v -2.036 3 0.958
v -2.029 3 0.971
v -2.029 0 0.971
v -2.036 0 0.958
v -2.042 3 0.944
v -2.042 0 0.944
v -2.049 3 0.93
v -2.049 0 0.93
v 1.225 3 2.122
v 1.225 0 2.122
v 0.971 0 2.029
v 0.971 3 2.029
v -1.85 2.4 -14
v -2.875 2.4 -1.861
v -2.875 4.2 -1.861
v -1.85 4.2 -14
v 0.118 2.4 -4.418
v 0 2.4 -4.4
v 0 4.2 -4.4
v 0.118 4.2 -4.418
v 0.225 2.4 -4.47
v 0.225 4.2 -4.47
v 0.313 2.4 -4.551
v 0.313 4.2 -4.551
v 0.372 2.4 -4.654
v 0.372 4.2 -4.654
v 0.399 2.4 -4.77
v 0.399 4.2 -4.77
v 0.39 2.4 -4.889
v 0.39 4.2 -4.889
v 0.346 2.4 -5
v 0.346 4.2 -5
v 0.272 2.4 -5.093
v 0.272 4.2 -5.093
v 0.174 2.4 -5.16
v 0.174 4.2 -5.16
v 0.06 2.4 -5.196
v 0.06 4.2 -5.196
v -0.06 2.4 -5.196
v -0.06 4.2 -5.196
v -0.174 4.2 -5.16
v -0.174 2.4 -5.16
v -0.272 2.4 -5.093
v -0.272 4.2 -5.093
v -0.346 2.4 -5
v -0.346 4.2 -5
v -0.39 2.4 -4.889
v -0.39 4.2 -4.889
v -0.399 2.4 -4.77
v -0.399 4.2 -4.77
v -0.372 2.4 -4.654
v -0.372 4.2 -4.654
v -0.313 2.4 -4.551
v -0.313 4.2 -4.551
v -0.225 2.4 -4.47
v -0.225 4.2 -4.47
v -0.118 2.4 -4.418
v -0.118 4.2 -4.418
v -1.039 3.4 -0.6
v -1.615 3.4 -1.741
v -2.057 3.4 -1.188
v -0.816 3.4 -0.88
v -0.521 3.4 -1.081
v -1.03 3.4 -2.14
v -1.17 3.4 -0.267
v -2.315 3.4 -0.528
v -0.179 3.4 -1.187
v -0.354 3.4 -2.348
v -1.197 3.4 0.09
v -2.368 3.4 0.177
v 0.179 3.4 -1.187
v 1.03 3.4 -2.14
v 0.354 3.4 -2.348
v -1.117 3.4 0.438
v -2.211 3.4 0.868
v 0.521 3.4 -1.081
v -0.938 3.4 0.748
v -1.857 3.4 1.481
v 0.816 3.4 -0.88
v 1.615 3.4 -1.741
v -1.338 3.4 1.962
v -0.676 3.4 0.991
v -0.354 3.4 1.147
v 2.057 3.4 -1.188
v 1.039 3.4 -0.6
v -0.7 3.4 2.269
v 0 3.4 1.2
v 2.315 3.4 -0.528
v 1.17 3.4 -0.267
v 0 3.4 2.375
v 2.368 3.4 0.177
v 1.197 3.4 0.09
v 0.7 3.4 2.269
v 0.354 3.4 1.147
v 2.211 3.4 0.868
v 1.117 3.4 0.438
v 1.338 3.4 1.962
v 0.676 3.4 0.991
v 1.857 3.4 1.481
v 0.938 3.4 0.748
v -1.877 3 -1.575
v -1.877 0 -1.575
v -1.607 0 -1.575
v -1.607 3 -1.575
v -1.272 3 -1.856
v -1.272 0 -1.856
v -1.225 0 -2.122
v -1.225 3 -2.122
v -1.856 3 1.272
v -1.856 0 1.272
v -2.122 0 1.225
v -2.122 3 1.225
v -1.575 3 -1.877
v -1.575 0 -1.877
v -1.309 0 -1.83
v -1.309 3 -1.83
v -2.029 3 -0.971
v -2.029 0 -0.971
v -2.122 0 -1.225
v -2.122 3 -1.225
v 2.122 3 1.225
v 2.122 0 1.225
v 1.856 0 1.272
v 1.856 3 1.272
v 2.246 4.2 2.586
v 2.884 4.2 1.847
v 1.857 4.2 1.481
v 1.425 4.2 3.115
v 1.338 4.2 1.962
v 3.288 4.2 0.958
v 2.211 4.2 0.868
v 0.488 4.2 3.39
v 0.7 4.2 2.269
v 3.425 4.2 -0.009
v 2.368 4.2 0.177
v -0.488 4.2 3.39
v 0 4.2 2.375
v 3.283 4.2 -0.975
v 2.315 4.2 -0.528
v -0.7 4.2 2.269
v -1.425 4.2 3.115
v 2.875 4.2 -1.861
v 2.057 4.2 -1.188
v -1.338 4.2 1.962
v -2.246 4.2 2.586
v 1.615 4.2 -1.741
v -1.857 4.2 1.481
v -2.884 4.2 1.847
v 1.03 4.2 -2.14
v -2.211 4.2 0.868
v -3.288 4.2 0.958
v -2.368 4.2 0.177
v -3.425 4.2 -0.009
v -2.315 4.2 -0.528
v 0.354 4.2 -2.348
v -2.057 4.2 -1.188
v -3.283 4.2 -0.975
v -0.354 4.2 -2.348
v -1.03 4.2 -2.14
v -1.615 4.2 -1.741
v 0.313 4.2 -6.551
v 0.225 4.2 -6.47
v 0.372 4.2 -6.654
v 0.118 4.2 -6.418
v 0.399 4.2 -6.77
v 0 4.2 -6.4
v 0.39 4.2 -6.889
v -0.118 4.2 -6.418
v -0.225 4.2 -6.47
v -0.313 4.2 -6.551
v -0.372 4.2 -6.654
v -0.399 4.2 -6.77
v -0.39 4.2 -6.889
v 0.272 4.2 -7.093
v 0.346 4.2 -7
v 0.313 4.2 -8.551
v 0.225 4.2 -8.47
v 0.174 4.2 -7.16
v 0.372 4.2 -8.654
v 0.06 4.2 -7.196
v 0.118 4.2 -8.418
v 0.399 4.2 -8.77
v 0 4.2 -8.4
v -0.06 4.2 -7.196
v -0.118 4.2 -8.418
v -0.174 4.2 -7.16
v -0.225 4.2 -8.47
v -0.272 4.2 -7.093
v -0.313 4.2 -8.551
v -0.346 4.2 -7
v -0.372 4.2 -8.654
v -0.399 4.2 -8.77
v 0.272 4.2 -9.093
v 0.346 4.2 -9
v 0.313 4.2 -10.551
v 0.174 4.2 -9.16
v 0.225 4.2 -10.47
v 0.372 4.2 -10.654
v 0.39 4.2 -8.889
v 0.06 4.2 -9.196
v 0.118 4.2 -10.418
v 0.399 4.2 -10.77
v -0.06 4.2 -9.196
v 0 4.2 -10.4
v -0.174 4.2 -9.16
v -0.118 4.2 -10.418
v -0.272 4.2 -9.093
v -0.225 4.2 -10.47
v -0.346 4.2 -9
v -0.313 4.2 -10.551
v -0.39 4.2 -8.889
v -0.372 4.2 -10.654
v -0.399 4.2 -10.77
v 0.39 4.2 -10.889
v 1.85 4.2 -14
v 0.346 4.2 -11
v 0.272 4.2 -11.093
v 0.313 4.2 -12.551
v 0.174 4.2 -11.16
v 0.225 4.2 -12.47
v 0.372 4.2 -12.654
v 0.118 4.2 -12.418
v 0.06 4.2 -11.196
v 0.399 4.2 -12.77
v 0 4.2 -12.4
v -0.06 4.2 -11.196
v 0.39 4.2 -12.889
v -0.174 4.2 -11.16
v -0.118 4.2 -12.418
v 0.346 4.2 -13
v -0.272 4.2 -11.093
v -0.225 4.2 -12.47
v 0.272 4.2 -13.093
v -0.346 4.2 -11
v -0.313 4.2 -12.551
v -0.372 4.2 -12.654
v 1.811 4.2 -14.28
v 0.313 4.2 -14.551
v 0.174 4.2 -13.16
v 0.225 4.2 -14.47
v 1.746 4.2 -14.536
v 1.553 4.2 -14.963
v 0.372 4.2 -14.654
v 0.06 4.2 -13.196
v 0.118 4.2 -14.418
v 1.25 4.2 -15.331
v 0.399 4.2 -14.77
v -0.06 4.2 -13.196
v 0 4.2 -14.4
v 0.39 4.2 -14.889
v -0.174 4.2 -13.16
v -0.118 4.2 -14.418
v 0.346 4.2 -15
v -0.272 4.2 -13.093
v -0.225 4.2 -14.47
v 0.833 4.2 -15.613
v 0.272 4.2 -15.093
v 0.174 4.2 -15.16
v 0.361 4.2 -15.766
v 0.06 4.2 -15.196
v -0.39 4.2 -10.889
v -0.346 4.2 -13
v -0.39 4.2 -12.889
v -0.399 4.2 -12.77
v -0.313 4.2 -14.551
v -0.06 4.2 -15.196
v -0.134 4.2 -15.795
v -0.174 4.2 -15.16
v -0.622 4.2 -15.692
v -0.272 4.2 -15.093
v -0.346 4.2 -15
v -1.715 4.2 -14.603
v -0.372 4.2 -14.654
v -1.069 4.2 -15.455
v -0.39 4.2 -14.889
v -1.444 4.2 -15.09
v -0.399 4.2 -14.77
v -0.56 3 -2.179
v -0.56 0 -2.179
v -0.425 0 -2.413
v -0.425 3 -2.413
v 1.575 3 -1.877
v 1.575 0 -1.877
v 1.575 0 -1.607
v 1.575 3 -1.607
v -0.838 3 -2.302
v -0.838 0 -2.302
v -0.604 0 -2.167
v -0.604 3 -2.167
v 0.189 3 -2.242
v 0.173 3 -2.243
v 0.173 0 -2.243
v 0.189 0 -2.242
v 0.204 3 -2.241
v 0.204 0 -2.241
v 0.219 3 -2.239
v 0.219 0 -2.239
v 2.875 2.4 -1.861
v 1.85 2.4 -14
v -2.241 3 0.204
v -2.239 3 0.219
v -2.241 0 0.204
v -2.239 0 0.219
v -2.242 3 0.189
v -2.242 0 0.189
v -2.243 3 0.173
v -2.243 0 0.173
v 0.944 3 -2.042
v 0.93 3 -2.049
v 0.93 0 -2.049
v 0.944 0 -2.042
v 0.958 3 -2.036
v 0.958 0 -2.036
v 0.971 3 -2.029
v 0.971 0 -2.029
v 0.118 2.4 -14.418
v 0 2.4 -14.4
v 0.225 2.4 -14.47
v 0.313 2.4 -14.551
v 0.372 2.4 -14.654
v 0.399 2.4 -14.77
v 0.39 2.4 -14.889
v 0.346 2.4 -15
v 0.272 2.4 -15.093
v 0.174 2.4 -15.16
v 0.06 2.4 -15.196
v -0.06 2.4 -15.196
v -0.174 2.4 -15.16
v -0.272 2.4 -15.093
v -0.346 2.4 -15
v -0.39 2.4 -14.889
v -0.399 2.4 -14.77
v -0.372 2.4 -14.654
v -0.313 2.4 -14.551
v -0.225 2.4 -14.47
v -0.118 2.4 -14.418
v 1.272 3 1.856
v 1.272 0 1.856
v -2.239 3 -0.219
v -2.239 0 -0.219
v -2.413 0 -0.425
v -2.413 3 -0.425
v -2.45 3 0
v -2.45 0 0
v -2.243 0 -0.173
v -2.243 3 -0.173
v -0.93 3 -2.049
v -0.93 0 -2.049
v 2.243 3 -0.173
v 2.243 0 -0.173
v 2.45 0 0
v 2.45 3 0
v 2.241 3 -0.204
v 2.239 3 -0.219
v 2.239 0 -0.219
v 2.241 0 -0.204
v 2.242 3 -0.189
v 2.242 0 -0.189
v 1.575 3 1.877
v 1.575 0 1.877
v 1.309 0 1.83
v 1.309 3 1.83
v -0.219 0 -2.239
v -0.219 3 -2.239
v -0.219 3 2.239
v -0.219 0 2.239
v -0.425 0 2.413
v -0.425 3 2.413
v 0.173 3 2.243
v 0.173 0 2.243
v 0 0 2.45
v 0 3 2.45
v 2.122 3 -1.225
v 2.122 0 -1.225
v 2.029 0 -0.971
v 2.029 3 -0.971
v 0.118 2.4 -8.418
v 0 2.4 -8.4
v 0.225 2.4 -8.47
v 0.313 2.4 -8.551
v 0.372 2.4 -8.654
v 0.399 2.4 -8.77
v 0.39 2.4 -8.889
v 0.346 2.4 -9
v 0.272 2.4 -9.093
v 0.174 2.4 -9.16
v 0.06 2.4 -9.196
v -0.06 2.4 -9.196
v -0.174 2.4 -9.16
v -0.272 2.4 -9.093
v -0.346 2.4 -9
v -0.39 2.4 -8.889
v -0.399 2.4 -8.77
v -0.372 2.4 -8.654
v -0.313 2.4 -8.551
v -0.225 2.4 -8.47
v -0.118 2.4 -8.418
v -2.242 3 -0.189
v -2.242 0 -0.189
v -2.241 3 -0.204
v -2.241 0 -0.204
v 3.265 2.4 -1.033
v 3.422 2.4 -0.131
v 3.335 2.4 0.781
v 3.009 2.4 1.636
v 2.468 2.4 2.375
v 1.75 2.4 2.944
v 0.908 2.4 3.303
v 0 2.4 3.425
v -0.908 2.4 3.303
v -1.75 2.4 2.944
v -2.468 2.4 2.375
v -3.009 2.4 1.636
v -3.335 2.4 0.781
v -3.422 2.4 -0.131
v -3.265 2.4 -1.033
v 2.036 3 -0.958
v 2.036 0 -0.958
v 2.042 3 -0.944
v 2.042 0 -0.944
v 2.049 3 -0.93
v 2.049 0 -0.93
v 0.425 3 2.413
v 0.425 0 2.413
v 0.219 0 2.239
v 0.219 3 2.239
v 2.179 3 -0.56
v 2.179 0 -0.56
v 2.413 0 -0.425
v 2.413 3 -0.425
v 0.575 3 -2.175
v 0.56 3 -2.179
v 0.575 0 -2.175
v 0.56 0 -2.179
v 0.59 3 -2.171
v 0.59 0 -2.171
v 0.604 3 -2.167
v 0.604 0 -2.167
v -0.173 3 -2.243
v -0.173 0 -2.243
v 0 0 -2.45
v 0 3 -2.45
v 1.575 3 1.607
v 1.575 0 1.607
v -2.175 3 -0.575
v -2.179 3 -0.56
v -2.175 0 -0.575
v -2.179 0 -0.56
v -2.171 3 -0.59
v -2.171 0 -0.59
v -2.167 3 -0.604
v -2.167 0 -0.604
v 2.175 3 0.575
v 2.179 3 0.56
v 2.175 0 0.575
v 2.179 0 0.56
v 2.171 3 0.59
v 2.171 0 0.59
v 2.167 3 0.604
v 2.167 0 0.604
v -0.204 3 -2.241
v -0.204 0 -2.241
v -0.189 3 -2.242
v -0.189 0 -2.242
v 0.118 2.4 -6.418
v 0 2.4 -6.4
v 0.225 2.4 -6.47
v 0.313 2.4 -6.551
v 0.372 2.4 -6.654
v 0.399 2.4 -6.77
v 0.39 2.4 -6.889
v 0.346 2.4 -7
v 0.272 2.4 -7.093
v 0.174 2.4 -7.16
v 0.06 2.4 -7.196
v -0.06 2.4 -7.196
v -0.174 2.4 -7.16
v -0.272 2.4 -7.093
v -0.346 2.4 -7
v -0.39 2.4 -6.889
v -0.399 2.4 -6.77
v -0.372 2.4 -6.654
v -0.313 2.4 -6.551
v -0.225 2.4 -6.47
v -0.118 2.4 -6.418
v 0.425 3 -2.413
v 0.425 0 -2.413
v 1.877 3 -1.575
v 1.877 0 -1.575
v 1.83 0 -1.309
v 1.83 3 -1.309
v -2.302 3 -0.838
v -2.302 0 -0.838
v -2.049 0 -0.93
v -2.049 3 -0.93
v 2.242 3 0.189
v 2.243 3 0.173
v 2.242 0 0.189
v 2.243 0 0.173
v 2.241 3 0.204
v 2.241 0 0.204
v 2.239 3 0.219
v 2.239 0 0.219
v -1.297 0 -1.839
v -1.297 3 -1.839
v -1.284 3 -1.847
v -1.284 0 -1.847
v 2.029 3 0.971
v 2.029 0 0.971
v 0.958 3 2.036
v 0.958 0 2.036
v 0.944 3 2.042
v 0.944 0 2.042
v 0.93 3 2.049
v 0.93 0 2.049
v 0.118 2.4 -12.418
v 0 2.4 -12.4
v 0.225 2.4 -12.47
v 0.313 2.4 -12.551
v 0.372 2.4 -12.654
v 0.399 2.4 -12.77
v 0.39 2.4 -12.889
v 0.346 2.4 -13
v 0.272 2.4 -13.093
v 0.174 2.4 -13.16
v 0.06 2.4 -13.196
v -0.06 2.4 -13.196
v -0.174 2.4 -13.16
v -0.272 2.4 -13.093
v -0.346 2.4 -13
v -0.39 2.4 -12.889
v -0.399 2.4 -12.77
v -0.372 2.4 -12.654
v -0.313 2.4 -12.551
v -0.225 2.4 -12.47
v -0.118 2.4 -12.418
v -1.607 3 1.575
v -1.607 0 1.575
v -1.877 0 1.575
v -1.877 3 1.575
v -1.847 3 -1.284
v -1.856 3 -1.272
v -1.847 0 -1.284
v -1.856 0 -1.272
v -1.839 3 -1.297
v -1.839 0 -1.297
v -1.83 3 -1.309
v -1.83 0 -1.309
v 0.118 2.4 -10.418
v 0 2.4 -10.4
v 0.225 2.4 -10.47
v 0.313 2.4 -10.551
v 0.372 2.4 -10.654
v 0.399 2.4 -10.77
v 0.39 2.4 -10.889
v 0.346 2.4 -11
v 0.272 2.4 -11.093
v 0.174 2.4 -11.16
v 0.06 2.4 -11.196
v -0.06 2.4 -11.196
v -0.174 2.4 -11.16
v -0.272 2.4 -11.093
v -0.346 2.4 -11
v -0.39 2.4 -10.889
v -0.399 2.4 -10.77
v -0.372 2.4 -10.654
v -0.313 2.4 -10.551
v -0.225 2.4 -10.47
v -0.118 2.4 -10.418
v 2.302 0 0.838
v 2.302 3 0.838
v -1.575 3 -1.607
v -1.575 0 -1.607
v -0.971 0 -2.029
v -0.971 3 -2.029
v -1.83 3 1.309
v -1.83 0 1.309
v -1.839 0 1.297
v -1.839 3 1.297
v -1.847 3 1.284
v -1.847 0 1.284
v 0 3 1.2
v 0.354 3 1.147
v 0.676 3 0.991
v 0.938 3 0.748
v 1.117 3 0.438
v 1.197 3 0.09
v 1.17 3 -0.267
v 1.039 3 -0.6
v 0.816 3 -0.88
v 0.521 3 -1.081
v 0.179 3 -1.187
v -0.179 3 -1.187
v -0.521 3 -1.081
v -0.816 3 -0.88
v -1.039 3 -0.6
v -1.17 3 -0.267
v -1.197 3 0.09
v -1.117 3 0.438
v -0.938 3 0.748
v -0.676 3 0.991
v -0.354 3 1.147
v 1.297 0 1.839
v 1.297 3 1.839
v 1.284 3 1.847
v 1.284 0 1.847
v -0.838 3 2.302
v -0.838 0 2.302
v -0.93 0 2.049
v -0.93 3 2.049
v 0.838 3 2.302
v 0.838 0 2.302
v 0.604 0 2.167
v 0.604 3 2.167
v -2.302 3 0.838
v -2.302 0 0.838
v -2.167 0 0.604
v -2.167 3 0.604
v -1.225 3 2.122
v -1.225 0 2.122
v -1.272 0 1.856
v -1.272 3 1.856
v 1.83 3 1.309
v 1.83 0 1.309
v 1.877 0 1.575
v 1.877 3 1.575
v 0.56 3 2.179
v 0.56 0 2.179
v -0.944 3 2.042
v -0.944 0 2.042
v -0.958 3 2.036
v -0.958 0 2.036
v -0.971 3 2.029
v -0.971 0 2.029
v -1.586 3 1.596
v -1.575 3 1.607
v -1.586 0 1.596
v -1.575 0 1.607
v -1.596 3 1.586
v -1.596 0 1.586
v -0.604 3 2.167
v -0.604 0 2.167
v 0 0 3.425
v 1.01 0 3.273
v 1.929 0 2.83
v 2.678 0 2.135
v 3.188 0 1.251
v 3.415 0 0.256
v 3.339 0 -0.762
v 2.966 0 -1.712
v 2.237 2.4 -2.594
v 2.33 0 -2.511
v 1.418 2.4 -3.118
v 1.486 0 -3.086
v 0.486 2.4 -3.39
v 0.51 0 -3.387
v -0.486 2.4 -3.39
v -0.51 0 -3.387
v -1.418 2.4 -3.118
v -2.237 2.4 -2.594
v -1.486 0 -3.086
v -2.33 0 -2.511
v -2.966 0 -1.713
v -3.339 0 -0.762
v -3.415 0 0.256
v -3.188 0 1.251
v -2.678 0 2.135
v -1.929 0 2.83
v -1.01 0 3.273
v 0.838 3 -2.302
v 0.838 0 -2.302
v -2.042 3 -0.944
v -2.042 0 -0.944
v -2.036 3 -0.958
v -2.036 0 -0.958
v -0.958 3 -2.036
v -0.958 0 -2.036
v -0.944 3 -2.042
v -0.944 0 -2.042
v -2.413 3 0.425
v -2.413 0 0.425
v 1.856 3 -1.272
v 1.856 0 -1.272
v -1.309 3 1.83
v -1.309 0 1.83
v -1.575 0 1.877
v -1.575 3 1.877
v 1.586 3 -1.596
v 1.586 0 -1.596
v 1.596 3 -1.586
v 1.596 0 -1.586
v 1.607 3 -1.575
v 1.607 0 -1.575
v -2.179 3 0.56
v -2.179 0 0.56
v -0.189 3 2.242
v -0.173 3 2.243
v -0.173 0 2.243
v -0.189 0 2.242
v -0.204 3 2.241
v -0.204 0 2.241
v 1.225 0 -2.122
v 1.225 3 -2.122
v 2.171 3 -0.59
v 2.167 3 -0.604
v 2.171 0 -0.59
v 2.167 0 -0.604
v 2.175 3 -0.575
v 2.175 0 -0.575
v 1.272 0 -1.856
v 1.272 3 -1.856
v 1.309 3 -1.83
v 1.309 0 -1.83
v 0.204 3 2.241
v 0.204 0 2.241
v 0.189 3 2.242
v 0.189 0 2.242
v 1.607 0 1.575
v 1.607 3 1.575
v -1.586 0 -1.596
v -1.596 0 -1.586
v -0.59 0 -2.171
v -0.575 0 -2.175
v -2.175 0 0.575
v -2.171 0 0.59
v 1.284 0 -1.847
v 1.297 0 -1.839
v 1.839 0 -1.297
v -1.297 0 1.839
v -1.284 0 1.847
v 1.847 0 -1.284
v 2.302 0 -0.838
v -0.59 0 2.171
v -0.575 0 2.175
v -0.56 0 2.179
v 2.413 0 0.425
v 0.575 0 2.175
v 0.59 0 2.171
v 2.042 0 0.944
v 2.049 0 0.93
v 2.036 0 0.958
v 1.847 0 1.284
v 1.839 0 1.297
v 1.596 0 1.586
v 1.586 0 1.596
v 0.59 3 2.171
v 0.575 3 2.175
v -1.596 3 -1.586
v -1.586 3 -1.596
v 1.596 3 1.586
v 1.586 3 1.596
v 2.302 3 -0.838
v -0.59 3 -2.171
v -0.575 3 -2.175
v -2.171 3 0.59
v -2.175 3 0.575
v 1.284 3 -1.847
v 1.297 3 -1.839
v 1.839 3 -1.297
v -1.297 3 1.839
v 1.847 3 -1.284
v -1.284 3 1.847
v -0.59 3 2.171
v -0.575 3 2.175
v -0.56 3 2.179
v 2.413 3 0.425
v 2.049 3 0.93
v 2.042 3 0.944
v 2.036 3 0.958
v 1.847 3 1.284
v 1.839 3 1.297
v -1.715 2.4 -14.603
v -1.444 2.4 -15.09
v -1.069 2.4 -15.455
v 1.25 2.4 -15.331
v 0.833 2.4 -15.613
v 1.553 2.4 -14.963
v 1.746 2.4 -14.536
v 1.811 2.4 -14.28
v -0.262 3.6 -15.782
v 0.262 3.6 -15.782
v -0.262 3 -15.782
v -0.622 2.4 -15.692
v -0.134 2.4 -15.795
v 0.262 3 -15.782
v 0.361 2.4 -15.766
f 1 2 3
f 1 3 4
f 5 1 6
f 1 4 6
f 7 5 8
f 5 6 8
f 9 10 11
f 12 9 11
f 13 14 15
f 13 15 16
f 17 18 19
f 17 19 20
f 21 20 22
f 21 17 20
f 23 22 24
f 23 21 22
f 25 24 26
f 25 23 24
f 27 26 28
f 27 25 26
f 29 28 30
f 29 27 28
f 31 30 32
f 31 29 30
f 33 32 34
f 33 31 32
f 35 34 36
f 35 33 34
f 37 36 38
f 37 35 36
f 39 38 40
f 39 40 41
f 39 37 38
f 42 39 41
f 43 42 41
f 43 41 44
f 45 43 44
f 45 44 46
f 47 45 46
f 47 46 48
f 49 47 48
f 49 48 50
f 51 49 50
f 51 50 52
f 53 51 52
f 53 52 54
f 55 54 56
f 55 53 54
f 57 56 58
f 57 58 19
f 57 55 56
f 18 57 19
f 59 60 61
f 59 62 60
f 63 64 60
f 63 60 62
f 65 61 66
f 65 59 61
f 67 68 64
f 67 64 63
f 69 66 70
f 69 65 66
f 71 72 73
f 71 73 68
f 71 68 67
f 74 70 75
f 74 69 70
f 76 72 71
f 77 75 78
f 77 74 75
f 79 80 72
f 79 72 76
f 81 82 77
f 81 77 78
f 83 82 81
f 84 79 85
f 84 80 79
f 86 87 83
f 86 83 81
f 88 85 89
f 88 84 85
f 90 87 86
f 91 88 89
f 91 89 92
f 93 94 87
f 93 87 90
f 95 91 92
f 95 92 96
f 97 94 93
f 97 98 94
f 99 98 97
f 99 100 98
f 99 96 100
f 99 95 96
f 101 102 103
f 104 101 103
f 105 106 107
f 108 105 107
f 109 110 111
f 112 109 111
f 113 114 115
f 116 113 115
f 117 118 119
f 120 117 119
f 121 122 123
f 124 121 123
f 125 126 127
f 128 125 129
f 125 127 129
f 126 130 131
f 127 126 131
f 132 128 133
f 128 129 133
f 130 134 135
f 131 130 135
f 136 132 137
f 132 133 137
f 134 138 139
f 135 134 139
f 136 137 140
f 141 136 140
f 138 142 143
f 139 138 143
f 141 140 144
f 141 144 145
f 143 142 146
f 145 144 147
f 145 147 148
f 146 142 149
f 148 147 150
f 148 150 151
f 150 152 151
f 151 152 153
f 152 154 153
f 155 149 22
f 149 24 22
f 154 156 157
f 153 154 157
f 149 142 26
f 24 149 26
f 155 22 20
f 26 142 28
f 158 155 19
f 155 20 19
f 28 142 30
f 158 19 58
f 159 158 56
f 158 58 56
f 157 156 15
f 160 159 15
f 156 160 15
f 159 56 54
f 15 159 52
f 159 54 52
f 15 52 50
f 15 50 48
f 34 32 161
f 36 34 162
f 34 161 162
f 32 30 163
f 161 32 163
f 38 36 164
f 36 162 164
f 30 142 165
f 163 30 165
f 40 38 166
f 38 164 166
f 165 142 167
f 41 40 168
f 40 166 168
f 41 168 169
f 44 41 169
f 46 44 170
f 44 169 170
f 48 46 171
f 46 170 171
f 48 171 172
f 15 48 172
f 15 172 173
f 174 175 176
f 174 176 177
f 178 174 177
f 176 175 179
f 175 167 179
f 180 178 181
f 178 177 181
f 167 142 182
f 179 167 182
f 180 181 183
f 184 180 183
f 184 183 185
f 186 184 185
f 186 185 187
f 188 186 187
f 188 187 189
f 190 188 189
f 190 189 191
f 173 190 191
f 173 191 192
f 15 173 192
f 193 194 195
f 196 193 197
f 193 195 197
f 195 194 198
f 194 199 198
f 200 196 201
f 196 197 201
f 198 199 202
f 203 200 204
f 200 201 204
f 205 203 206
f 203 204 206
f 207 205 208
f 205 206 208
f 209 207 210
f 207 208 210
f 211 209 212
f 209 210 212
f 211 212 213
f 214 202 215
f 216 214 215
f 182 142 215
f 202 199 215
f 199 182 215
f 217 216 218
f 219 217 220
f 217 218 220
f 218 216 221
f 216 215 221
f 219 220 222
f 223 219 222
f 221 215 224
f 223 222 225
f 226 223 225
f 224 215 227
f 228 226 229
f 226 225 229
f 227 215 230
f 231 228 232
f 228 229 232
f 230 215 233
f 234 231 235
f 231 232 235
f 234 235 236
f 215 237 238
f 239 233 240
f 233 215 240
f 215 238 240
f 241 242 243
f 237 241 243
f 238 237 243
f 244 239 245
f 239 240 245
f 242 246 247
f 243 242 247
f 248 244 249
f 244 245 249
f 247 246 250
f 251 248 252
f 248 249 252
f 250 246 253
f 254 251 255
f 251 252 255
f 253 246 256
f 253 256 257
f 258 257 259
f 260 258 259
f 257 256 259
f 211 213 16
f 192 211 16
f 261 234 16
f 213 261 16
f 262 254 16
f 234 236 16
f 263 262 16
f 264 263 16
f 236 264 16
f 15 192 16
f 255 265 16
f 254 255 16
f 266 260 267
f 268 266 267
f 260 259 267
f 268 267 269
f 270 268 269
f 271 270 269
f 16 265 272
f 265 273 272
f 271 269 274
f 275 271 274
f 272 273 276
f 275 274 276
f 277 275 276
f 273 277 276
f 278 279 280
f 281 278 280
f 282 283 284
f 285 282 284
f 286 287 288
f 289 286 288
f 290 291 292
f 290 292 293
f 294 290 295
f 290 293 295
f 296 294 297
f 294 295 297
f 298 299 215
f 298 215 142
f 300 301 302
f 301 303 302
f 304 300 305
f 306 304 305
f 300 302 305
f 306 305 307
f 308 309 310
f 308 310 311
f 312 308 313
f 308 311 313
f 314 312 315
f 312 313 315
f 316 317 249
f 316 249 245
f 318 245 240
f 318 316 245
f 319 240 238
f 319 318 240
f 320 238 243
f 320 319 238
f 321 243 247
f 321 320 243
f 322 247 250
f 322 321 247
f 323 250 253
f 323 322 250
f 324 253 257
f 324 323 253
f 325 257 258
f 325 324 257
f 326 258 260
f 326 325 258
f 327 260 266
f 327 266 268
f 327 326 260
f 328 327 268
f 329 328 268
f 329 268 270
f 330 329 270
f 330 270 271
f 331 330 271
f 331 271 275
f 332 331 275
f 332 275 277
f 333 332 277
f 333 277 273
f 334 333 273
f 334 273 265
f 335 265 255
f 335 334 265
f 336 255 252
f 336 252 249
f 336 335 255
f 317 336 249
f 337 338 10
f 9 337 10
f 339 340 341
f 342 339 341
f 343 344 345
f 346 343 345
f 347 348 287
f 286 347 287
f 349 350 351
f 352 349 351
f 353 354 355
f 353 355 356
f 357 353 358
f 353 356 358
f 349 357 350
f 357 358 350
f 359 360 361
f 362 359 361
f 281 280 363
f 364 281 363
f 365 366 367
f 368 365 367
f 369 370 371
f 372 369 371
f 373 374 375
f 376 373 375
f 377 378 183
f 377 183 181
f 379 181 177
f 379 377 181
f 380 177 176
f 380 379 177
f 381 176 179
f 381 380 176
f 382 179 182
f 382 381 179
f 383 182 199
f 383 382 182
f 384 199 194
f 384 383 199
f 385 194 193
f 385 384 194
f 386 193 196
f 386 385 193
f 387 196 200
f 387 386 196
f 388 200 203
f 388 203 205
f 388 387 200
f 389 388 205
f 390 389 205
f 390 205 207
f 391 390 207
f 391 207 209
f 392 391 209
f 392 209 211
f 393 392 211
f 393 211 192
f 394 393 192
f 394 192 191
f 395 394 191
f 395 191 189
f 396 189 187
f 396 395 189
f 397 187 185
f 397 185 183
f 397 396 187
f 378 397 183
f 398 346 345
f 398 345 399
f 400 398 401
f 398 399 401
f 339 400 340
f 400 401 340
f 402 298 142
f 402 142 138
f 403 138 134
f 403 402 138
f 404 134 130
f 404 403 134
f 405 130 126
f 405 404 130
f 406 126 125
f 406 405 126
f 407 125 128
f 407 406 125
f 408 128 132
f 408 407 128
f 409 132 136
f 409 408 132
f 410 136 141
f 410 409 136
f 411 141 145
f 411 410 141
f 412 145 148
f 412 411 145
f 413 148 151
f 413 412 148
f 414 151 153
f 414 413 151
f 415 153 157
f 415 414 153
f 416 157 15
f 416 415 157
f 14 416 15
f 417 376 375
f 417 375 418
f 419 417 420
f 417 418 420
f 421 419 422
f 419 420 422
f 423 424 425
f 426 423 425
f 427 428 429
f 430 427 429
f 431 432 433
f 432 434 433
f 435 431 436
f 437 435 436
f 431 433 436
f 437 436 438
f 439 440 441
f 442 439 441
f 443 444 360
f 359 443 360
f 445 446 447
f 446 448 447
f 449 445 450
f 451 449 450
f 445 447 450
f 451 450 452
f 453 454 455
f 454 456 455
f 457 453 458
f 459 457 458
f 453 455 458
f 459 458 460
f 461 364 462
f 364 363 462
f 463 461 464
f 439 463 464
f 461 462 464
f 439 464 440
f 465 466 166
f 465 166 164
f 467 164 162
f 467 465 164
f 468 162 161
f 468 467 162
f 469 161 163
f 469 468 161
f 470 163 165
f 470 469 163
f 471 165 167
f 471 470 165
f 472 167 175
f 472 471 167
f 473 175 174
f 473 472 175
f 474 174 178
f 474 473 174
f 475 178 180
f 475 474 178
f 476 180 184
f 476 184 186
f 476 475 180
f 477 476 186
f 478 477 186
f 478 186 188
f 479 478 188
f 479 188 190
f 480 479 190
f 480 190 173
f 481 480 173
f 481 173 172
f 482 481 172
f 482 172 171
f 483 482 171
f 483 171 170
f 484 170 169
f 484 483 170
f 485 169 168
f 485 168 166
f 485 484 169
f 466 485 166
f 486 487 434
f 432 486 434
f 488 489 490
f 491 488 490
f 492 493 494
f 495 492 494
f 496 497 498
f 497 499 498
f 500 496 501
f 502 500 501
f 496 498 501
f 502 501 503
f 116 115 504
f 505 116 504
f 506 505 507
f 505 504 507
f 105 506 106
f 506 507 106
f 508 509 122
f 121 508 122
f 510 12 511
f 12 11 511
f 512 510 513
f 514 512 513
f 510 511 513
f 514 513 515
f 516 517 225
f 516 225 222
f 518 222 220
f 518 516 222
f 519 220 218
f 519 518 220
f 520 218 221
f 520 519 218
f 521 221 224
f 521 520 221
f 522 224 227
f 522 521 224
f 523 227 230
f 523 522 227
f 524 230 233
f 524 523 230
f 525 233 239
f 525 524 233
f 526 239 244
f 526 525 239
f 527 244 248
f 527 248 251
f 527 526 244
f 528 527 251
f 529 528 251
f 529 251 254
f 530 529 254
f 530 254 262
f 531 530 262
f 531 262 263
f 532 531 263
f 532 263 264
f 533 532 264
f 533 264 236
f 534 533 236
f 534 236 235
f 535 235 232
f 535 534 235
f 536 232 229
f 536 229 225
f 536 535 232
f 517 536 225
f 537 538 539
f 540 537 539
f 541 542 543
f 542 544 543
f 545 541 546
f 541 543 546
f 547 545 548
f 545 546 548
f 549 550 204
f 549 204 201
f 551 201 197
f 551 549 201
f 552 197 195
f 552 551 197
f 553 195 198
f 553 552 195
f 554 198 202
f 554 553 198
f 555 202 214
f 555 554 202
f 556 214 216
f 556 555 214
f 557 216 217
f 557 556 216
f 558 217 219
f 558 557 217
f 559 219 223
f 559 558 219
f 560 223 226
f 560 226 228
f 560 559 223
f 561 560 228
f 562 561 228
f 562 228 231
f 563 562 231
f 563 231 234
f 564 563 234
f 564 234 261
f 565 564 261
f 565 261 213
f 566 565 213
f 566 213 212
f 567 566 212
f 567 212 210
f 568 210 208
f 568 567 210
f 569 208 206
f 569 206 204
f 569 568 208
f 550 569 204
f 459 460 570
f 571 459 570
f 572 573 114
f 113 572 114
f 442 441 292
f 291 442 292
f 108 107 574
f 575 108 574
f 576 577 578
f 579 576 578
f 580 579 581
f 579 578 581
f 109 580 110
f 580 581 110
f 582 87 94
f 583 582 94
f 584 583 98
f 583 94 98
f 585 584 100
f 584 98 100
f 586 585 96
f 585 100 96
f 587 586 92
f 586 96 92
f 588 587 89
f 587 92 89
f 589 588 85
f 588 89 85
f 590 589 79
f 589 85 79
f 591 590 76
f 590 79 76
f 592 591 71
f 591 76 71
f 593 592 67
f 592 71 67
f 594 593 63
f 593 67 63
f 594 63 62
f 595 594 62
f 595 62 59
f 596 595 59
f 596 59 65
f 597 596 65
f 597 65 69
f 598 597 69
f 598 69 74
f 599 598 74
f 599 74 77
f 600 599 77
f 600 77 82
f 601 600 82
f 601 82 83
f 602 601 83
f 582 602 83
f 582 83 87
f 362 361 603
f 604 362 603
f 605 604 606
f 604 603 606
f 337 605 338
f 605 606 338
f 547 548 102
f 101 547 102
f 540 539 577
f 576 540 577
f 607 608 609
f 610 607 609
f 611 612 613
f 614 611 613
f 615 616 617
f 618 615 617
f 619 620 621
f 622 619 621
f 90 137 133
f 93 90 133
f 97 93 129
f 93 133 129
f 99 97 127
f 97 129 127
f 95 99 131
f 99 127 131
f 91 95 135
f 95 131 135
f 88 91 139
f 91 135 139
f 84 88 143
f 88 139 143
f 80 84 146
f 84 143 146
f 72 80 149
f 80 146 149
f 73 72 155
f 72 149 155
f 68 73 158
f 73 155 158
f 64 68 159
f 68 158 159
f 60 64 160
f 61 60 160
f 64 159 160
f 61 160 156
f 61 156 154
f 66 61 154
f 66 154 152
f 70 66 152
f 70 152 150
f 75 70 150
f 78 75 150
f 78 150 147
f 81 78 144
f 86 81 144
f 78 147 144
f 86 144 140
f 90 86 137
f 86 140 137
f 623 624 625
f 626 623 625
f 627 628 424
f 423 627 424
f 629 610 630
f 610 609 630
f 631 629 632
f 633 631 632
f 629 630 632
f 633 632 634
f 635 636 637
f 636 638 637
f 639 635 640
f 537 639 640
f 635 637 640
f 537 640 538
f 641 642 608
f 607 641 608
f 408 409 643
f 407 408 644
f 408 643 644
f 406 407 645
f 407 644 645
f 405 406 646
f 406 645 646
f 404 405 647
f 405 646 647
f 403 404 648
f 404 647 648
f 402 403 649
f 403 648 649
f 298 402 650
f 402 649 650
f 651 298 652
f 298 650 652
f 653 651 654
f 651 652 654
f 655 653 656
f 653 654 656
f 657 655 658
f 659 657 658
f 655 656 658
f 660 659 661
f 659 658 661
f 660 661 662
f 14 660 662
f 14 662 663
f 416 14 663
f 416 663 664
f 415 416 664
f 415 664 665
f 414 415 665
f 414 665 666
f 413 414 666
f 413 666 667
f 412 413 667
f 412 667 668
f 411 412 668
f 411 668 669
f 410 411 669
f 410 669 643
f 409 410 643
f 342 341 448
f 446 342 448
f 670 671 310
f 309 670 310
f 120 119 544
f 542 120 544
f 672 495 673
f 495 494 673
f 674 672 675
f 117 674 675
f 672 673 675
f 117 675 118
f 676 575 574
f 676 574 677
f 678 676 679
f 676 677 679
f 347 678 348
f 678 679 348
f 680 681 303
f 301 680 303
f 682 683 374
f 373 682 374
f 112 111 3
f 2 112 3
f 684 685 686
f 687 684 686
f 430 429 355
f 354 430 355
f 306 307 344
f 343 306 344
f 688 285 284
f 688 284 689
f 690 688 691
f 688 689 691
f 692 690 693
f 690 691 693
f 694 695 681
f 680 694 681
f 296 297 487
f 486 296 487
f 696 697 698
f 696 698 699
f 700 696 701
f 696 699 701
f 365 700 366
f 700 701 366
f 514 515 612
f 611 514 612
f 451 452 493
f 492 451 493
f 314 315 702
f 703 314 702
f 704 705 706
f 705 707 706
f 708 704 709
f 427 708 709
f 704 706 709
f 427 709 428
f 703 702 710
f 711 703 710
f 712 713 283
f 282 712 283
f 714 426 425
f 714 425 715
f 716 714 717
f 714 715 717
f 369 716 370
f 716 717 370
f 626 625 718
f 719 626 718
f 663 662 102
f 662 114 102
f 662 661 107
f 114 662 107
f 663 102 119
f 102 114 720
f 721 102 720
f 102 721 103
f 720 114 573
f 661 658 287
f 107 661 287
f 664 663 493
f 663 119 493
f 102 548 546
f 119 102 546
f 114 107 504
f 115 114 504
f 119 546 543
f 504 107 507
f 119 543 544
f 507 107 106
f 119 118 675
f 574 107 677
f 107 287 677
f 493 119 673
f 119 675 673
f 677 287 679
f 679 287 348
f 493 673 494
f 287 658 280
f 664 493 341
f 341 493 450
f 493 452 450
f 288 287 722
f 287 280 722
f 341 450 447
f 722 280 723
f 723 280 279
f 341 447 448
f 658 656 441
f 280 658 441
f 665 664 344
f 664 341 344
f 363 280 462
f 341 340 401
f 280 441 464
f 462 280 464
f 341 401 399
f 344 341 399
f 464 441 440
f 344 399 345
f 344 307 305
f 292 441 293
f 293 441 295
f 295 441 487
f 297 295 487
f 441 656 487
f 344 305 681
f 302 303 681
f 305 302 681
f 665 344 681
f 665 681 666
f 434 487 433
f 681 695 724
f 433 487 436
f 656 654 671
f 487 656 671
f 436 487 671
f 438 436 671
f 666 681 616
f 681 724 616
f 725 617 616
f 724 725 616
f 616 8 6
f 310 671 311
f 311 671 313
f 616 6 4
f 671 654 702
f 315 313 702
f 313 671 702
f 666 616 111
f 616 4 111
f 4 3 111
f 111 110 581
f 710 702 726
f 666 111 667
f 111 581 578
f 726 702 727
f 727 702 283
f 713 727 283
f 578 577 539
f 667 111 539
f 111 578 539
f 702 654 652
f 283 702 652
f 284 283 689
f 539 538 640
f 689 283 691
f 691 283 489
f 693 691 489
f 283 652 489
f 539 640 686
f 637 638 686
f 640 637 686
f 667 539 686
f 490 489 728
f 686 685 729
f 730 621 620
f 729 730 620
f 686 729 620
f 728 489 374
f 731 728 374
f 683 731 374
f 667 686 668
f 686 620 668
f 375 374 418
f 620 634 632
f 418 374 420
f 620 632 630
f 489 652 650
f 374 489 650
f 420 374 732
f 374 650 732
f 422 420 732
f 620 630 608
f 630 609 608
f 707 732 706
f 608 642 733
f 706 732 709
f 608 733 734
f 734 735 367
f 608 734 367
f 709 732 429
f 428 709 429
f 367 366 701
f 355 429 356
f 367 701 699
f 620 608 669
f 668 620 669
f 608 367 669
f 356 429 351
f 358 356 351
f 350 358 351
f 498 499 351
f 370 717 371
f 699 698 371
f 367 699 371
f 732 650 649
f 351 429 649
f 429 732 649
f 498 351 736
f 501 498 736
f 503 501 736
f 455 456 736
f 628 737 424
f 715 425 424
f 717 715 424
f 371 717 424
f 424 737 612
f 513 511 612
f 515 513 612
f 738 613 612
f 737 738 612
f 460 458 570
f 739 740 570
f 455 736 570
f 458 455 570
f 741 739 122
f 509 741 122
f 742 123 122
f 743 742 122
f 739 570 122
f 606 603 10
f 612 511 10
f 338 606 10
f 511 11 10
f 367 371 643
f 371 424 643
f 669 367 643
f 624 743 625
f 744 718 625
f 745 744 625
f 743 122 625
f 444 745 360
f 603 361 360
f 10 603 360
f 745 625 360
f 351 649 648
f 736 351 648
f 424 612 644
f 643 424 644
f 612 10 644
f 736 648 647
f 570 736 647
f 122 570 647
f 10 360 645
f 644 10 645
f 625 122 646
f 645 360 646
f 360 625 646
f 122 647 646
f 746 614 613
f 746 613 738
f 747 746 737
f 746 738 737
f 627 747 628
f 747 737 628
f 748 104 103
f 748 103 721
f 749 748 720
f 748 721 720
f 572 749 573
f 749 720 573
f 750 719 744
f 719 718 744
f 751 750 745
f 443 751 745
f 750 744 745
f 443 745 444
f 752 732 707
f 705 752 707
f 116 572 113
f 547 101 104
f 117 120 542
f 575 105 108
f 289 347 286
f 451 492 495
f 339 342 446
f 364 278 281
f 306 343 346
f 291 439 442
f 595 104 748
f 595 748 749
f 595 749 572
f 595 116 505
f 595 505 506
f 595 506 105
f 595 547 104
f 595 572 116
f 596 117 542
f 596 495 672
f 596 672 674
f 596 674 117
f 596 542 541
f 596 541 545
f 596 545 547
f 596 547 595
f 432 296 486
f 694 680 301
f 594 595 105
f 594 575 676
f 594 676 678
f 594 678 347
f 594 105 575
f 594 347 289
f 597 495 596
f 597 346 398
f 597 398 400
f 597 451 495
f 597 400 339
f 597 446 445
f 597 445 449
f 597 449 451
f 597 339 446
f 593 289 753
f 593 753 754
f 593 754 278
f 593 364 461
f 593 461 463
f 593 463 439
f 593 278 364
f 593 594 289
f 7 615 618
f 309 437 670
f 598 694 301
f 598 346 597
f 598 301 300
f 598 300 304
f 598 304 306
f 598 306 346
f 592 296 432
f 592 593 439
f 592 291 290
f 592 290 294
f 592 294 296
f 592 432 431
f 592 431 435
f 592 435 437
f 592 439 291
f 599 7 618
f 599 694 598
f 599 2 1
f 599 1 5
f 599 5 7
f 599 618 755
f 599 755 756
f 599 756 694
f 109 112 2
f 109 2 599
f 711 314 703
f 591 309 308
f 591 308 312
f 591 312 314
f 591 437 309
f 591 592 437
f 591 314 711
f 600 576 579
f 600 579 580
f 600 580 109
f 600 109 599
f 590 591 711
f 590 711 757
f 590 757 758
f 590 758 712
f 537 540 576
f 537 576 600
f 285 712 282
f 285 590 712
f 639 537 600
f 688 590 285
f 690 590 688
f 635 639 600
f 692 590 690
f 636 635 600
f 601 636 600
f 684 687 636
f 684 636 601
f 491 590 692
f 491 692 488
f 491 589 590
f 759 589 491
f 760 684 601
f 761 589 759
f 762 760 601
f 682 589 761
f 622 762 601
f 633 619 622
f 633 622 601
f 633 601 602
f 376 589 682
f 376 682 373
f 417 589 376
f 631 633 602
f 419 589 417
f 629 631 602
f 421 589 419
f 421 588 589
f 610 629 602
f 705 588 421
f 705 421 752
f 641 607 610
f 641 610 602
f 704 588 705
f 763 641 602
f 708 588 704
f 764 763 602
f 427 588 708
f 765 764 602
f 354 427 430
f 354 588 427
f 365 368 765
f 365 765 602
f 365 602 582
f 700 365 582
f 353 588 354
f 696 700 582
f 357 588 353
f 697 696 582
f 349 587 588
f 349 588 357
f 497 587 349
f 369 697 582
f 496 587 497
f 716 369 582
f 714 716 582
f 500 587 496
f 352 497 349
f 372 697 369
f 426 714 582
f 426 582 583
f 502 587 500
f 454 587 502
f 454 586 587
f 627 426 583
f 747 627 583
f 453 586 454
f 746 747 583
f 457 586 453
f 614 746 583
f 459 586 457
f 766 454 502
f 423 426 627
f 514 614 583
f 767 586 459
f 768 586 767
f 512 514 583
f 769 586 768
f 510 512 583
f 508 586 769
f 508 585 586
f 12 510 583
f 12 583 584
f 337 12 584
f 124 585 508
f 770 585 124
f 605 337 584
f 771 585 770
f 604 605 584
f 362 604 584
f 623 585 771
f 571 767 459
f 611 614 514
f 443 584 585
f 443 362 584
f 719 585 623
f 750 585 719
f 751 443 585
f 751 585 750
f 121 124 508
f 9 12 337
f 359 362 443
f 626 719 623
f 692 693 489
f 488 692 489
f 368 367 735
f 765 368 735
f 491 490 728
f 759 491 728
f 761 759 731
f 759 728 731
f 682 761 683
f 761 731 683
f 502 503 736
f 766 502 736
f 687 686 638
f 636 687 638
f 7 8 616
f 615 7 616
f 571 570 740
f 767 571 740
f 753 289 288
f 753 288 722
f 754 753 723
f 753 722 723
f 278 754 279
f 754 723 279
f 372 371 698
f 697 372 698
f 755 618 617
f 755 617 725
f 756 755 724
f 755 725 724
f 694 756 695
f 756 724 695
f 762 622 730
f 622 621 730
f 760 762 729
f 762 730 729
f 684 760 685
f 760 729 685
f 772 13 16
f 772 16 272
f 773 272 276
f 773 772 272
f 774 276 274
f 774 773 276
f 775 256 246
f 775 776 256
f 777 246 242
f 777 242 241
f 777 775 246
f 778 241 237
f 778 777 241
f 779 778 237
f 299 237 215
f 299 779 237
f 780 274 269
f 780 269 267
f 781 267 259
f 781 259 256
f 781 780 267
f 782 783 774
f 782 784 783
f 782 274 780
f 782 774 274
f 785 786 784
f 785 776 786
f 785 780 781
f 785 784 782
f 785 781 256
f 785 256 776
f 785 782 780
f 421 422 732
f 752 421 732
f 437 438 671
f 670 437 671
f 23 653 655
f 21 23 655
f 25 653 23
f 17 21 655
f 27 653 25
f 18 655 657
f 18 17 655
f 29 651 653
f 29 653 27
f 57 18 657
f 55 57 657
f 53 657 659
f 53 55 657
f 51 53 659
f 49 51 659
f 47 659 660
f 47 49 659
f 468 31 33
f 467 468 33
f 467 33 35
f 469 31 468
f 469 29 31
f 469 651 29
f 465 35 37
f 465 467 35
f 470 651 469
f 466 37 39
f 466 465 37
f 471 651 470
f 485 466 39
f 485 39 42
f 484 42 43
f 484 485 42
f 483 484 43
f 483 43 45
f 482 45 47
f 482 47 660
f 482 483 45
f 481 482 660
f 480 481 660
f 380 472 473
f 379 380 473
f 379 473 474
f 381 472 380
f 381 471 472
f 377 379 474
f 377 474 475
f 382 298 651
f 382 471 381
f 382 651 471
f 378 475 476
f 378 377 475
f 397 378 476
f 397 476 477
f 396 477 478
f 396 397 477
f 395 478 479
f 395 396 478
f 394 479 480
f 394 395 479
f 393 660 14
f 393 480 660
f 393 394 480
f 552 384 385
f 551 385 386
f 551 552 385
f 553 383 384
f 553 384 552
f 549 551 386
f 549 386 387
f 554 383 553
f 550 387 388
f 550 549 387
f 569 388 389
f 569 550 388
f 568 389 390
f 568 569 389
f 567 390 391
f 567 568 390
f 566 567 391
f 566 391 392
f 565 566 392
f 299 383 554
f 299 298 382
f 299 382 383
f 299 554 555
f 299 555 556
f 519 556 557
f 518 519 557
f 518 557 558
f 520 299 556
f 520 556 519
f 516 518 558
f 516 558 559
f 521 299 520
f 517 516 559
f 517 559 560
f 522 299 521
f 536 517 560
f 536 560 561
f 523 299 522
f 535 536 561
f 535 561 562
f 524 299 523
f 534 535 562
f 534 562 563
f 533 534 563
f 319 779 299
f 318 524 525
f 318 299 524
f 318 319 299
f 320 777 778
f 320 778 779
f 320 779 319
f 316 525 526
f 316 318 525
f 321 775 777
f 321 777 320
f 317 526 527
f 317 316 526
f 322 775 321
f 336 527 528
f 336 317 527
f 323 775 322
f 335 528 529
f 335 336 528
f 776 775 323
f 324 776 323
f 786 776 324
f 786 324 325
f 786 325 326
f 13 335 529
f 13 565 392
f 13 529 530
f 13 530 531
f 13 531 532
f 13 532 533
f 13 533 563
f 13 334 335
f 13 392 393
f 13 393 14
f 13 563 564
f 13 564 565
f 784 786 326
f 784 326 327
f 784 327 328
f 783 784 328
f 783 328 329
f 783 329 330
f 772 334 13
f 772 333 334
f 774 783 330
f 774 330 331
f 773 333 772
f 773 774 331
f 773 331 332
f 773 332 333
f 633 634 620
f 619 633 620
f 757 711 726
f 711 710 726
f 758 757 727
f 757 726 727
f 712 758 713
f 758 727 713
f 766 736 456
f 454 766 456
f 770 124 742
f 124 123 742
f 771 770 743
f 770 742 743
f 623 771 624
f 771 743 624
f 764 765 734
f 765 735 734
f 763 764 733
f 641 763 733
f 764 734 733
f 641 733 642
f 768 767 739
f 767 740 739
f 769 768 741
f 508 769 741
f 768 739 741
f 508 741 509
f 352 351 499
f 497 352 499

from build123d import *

# Parameters (mm, degrees)
SKETCH1_R           = 3.425
HUB_DEPTH           = 2.4
SKETCH2_R           = 0.4
BOSS_EXTRUDE2_DEPTH = 1.8
SKETCH3_R           = 2.375
CUT_EXTRUDE1_DEPTH  = 0.8
SKETCH4_R           = 1.2
CUT_EXTRUDE2_DEPTH  = 17.520612
CUT_EXTRUDE3_DEPTH  = 3
CIRPATTERN1_COUNT   = 36
SKETCH6_R           = 2.25
CUT_EXTRUDE4_DEPTH  = 3


with BuildPart() as part:
    # Sketch1 → HUB (new body)
    with BuildSketch(Plane(origin=(0, 0, 0), x_dir=(1, 0, 0), z_dir=(0, 1, 0))):
        with Locations(Location((0, 0, 0), (0, 0, 270))):
            Circle(SKETCH1_R)
    extrude(amount=HUB_DEPTH)

    # Sketch2 → Boss-Extrude2 (add)
    with BuildSketch(Plane(origin=(0, 2.4, 0), x_dir=(1, 0, 0), z_dir=(0, 1, 0))):
        with BuildLine():
            Line((-2.875, 1.861451), (-1.85, 14))
            add(Edge.make_bspline(
                [(-1.85, 14), (-1.761904, 15.043277), (-0.882336, 15.809649), (0.882387, 15.802355), (1.755744, 15.11622), (1.85, 14)],
                knots=[0, 0, 0, 0, 0.45, 0.55, 1, 1, 1, 1], degree=3))
            Line((1.85, 14), (2.875, 1.861451))
            ThreePointArc((2.875, 1.861451), (0, -3.425), (-2.875, 1.861451))
        make_face()
        with Locations(Location((0, 14.8, 0), (0, 0, 270))):
            Circle(SKETCH2_R, mode=Mode.SUBTRACT)
        with Locations(Location((0, 12.8, 0), (0, 0, 270))):
            Circle(SKETCH2_R, mode=Mode.SUBTRACT)
        with Locations(Location((0, 10.8, 0), (0, 0, 270))):
            Circle(SKETCH2_R, mode=Mode.SUBTRACT)
        with Locations(Location((0, 8.8, 0), (0, 0, 270))):
            Circle(SKETCH2_R, mode=Mode.SUBTRACT)
        with Locations(Location((0, 6.8, 0), (0, 0, 270))):
            Circle(SKETCH2_R, mode=Mode.SUBTRACT)
        with Locations(Location((0, 4.8, 0), (0, 0, 270))):
            Circle(SKETCH2_R, mode=Mode.SUBTRACT)
    extrude(amount=BOSS_EXTRUDE2_DEPTH)

    # Sketch3 → Cut-Extrude1 (cut)
    with BuildSketch(Plane(origin=(0, 4.2, 0), x_dir=(1, 0, 0), z_dir=(0, 1, 0))):
        with Locations(Location((0, 0, 0), (0, 0, 270))):
            Circle(SKETCH3_R)
    extrude(amount=-CUT_EXTRUDE1_DEPTH, mode=Mode.SUBTRACT)

    # Sketch4 → Cut-Extrude2 (cut, through all)
    with BuildSketch(Plane(origin=(0, 3.4, 0), x_dir=(1, 0, 0), z_dir=(0, 1, 0))):
        with Locations(Location((0, 0, 0), (0, 0, 270))):
            Circle(SKETCH4_R)
    extrude(amount=-CUT_EXTRUDE2_DEPTH, mode=Mode.SUBTRACT)

    # Sketch5 → Cut-Extrude3 (cut)
    with BuildSketch(Plane.XZ):
        with BuildLine():
            Line((0, 2.45), (-0.173437, 2.243305))
            ThreePointArc((-0.173437, 2.243305), (0, 2.25), (0.173437, 2.243305))
            Line((0.173437, 2.243305), (0, 2.45))
        make_face()
    cut_extrude3 = extrude(amount=-CUT_EXTRUDE3_DEPTH, mode=Mode.SUBTRACT)

    # CirPattern1: Cut-Extrude3 ×36 about axis
    cirpattern1_axis = Axis((0, 0, 0), (0, 1, 0))
    for i in range(1, CIRPATTERN1_COUNT):
        add(cut_extrude3.rotate(cirpattern1_axis, i * 360 / CIRPATTERN1_COUNT), mode=Mode.SUBTRACT)

    # Sketch6 → Cut-Extrude4 (cut)
    with BuildSketch(Plane.XZ):
        Circle(SKETCH6_R)
    extrude(amount=-CUT_EXTRUDE4_DEPTH, mode=Mode.SUBTRACT)


solid = part.part
